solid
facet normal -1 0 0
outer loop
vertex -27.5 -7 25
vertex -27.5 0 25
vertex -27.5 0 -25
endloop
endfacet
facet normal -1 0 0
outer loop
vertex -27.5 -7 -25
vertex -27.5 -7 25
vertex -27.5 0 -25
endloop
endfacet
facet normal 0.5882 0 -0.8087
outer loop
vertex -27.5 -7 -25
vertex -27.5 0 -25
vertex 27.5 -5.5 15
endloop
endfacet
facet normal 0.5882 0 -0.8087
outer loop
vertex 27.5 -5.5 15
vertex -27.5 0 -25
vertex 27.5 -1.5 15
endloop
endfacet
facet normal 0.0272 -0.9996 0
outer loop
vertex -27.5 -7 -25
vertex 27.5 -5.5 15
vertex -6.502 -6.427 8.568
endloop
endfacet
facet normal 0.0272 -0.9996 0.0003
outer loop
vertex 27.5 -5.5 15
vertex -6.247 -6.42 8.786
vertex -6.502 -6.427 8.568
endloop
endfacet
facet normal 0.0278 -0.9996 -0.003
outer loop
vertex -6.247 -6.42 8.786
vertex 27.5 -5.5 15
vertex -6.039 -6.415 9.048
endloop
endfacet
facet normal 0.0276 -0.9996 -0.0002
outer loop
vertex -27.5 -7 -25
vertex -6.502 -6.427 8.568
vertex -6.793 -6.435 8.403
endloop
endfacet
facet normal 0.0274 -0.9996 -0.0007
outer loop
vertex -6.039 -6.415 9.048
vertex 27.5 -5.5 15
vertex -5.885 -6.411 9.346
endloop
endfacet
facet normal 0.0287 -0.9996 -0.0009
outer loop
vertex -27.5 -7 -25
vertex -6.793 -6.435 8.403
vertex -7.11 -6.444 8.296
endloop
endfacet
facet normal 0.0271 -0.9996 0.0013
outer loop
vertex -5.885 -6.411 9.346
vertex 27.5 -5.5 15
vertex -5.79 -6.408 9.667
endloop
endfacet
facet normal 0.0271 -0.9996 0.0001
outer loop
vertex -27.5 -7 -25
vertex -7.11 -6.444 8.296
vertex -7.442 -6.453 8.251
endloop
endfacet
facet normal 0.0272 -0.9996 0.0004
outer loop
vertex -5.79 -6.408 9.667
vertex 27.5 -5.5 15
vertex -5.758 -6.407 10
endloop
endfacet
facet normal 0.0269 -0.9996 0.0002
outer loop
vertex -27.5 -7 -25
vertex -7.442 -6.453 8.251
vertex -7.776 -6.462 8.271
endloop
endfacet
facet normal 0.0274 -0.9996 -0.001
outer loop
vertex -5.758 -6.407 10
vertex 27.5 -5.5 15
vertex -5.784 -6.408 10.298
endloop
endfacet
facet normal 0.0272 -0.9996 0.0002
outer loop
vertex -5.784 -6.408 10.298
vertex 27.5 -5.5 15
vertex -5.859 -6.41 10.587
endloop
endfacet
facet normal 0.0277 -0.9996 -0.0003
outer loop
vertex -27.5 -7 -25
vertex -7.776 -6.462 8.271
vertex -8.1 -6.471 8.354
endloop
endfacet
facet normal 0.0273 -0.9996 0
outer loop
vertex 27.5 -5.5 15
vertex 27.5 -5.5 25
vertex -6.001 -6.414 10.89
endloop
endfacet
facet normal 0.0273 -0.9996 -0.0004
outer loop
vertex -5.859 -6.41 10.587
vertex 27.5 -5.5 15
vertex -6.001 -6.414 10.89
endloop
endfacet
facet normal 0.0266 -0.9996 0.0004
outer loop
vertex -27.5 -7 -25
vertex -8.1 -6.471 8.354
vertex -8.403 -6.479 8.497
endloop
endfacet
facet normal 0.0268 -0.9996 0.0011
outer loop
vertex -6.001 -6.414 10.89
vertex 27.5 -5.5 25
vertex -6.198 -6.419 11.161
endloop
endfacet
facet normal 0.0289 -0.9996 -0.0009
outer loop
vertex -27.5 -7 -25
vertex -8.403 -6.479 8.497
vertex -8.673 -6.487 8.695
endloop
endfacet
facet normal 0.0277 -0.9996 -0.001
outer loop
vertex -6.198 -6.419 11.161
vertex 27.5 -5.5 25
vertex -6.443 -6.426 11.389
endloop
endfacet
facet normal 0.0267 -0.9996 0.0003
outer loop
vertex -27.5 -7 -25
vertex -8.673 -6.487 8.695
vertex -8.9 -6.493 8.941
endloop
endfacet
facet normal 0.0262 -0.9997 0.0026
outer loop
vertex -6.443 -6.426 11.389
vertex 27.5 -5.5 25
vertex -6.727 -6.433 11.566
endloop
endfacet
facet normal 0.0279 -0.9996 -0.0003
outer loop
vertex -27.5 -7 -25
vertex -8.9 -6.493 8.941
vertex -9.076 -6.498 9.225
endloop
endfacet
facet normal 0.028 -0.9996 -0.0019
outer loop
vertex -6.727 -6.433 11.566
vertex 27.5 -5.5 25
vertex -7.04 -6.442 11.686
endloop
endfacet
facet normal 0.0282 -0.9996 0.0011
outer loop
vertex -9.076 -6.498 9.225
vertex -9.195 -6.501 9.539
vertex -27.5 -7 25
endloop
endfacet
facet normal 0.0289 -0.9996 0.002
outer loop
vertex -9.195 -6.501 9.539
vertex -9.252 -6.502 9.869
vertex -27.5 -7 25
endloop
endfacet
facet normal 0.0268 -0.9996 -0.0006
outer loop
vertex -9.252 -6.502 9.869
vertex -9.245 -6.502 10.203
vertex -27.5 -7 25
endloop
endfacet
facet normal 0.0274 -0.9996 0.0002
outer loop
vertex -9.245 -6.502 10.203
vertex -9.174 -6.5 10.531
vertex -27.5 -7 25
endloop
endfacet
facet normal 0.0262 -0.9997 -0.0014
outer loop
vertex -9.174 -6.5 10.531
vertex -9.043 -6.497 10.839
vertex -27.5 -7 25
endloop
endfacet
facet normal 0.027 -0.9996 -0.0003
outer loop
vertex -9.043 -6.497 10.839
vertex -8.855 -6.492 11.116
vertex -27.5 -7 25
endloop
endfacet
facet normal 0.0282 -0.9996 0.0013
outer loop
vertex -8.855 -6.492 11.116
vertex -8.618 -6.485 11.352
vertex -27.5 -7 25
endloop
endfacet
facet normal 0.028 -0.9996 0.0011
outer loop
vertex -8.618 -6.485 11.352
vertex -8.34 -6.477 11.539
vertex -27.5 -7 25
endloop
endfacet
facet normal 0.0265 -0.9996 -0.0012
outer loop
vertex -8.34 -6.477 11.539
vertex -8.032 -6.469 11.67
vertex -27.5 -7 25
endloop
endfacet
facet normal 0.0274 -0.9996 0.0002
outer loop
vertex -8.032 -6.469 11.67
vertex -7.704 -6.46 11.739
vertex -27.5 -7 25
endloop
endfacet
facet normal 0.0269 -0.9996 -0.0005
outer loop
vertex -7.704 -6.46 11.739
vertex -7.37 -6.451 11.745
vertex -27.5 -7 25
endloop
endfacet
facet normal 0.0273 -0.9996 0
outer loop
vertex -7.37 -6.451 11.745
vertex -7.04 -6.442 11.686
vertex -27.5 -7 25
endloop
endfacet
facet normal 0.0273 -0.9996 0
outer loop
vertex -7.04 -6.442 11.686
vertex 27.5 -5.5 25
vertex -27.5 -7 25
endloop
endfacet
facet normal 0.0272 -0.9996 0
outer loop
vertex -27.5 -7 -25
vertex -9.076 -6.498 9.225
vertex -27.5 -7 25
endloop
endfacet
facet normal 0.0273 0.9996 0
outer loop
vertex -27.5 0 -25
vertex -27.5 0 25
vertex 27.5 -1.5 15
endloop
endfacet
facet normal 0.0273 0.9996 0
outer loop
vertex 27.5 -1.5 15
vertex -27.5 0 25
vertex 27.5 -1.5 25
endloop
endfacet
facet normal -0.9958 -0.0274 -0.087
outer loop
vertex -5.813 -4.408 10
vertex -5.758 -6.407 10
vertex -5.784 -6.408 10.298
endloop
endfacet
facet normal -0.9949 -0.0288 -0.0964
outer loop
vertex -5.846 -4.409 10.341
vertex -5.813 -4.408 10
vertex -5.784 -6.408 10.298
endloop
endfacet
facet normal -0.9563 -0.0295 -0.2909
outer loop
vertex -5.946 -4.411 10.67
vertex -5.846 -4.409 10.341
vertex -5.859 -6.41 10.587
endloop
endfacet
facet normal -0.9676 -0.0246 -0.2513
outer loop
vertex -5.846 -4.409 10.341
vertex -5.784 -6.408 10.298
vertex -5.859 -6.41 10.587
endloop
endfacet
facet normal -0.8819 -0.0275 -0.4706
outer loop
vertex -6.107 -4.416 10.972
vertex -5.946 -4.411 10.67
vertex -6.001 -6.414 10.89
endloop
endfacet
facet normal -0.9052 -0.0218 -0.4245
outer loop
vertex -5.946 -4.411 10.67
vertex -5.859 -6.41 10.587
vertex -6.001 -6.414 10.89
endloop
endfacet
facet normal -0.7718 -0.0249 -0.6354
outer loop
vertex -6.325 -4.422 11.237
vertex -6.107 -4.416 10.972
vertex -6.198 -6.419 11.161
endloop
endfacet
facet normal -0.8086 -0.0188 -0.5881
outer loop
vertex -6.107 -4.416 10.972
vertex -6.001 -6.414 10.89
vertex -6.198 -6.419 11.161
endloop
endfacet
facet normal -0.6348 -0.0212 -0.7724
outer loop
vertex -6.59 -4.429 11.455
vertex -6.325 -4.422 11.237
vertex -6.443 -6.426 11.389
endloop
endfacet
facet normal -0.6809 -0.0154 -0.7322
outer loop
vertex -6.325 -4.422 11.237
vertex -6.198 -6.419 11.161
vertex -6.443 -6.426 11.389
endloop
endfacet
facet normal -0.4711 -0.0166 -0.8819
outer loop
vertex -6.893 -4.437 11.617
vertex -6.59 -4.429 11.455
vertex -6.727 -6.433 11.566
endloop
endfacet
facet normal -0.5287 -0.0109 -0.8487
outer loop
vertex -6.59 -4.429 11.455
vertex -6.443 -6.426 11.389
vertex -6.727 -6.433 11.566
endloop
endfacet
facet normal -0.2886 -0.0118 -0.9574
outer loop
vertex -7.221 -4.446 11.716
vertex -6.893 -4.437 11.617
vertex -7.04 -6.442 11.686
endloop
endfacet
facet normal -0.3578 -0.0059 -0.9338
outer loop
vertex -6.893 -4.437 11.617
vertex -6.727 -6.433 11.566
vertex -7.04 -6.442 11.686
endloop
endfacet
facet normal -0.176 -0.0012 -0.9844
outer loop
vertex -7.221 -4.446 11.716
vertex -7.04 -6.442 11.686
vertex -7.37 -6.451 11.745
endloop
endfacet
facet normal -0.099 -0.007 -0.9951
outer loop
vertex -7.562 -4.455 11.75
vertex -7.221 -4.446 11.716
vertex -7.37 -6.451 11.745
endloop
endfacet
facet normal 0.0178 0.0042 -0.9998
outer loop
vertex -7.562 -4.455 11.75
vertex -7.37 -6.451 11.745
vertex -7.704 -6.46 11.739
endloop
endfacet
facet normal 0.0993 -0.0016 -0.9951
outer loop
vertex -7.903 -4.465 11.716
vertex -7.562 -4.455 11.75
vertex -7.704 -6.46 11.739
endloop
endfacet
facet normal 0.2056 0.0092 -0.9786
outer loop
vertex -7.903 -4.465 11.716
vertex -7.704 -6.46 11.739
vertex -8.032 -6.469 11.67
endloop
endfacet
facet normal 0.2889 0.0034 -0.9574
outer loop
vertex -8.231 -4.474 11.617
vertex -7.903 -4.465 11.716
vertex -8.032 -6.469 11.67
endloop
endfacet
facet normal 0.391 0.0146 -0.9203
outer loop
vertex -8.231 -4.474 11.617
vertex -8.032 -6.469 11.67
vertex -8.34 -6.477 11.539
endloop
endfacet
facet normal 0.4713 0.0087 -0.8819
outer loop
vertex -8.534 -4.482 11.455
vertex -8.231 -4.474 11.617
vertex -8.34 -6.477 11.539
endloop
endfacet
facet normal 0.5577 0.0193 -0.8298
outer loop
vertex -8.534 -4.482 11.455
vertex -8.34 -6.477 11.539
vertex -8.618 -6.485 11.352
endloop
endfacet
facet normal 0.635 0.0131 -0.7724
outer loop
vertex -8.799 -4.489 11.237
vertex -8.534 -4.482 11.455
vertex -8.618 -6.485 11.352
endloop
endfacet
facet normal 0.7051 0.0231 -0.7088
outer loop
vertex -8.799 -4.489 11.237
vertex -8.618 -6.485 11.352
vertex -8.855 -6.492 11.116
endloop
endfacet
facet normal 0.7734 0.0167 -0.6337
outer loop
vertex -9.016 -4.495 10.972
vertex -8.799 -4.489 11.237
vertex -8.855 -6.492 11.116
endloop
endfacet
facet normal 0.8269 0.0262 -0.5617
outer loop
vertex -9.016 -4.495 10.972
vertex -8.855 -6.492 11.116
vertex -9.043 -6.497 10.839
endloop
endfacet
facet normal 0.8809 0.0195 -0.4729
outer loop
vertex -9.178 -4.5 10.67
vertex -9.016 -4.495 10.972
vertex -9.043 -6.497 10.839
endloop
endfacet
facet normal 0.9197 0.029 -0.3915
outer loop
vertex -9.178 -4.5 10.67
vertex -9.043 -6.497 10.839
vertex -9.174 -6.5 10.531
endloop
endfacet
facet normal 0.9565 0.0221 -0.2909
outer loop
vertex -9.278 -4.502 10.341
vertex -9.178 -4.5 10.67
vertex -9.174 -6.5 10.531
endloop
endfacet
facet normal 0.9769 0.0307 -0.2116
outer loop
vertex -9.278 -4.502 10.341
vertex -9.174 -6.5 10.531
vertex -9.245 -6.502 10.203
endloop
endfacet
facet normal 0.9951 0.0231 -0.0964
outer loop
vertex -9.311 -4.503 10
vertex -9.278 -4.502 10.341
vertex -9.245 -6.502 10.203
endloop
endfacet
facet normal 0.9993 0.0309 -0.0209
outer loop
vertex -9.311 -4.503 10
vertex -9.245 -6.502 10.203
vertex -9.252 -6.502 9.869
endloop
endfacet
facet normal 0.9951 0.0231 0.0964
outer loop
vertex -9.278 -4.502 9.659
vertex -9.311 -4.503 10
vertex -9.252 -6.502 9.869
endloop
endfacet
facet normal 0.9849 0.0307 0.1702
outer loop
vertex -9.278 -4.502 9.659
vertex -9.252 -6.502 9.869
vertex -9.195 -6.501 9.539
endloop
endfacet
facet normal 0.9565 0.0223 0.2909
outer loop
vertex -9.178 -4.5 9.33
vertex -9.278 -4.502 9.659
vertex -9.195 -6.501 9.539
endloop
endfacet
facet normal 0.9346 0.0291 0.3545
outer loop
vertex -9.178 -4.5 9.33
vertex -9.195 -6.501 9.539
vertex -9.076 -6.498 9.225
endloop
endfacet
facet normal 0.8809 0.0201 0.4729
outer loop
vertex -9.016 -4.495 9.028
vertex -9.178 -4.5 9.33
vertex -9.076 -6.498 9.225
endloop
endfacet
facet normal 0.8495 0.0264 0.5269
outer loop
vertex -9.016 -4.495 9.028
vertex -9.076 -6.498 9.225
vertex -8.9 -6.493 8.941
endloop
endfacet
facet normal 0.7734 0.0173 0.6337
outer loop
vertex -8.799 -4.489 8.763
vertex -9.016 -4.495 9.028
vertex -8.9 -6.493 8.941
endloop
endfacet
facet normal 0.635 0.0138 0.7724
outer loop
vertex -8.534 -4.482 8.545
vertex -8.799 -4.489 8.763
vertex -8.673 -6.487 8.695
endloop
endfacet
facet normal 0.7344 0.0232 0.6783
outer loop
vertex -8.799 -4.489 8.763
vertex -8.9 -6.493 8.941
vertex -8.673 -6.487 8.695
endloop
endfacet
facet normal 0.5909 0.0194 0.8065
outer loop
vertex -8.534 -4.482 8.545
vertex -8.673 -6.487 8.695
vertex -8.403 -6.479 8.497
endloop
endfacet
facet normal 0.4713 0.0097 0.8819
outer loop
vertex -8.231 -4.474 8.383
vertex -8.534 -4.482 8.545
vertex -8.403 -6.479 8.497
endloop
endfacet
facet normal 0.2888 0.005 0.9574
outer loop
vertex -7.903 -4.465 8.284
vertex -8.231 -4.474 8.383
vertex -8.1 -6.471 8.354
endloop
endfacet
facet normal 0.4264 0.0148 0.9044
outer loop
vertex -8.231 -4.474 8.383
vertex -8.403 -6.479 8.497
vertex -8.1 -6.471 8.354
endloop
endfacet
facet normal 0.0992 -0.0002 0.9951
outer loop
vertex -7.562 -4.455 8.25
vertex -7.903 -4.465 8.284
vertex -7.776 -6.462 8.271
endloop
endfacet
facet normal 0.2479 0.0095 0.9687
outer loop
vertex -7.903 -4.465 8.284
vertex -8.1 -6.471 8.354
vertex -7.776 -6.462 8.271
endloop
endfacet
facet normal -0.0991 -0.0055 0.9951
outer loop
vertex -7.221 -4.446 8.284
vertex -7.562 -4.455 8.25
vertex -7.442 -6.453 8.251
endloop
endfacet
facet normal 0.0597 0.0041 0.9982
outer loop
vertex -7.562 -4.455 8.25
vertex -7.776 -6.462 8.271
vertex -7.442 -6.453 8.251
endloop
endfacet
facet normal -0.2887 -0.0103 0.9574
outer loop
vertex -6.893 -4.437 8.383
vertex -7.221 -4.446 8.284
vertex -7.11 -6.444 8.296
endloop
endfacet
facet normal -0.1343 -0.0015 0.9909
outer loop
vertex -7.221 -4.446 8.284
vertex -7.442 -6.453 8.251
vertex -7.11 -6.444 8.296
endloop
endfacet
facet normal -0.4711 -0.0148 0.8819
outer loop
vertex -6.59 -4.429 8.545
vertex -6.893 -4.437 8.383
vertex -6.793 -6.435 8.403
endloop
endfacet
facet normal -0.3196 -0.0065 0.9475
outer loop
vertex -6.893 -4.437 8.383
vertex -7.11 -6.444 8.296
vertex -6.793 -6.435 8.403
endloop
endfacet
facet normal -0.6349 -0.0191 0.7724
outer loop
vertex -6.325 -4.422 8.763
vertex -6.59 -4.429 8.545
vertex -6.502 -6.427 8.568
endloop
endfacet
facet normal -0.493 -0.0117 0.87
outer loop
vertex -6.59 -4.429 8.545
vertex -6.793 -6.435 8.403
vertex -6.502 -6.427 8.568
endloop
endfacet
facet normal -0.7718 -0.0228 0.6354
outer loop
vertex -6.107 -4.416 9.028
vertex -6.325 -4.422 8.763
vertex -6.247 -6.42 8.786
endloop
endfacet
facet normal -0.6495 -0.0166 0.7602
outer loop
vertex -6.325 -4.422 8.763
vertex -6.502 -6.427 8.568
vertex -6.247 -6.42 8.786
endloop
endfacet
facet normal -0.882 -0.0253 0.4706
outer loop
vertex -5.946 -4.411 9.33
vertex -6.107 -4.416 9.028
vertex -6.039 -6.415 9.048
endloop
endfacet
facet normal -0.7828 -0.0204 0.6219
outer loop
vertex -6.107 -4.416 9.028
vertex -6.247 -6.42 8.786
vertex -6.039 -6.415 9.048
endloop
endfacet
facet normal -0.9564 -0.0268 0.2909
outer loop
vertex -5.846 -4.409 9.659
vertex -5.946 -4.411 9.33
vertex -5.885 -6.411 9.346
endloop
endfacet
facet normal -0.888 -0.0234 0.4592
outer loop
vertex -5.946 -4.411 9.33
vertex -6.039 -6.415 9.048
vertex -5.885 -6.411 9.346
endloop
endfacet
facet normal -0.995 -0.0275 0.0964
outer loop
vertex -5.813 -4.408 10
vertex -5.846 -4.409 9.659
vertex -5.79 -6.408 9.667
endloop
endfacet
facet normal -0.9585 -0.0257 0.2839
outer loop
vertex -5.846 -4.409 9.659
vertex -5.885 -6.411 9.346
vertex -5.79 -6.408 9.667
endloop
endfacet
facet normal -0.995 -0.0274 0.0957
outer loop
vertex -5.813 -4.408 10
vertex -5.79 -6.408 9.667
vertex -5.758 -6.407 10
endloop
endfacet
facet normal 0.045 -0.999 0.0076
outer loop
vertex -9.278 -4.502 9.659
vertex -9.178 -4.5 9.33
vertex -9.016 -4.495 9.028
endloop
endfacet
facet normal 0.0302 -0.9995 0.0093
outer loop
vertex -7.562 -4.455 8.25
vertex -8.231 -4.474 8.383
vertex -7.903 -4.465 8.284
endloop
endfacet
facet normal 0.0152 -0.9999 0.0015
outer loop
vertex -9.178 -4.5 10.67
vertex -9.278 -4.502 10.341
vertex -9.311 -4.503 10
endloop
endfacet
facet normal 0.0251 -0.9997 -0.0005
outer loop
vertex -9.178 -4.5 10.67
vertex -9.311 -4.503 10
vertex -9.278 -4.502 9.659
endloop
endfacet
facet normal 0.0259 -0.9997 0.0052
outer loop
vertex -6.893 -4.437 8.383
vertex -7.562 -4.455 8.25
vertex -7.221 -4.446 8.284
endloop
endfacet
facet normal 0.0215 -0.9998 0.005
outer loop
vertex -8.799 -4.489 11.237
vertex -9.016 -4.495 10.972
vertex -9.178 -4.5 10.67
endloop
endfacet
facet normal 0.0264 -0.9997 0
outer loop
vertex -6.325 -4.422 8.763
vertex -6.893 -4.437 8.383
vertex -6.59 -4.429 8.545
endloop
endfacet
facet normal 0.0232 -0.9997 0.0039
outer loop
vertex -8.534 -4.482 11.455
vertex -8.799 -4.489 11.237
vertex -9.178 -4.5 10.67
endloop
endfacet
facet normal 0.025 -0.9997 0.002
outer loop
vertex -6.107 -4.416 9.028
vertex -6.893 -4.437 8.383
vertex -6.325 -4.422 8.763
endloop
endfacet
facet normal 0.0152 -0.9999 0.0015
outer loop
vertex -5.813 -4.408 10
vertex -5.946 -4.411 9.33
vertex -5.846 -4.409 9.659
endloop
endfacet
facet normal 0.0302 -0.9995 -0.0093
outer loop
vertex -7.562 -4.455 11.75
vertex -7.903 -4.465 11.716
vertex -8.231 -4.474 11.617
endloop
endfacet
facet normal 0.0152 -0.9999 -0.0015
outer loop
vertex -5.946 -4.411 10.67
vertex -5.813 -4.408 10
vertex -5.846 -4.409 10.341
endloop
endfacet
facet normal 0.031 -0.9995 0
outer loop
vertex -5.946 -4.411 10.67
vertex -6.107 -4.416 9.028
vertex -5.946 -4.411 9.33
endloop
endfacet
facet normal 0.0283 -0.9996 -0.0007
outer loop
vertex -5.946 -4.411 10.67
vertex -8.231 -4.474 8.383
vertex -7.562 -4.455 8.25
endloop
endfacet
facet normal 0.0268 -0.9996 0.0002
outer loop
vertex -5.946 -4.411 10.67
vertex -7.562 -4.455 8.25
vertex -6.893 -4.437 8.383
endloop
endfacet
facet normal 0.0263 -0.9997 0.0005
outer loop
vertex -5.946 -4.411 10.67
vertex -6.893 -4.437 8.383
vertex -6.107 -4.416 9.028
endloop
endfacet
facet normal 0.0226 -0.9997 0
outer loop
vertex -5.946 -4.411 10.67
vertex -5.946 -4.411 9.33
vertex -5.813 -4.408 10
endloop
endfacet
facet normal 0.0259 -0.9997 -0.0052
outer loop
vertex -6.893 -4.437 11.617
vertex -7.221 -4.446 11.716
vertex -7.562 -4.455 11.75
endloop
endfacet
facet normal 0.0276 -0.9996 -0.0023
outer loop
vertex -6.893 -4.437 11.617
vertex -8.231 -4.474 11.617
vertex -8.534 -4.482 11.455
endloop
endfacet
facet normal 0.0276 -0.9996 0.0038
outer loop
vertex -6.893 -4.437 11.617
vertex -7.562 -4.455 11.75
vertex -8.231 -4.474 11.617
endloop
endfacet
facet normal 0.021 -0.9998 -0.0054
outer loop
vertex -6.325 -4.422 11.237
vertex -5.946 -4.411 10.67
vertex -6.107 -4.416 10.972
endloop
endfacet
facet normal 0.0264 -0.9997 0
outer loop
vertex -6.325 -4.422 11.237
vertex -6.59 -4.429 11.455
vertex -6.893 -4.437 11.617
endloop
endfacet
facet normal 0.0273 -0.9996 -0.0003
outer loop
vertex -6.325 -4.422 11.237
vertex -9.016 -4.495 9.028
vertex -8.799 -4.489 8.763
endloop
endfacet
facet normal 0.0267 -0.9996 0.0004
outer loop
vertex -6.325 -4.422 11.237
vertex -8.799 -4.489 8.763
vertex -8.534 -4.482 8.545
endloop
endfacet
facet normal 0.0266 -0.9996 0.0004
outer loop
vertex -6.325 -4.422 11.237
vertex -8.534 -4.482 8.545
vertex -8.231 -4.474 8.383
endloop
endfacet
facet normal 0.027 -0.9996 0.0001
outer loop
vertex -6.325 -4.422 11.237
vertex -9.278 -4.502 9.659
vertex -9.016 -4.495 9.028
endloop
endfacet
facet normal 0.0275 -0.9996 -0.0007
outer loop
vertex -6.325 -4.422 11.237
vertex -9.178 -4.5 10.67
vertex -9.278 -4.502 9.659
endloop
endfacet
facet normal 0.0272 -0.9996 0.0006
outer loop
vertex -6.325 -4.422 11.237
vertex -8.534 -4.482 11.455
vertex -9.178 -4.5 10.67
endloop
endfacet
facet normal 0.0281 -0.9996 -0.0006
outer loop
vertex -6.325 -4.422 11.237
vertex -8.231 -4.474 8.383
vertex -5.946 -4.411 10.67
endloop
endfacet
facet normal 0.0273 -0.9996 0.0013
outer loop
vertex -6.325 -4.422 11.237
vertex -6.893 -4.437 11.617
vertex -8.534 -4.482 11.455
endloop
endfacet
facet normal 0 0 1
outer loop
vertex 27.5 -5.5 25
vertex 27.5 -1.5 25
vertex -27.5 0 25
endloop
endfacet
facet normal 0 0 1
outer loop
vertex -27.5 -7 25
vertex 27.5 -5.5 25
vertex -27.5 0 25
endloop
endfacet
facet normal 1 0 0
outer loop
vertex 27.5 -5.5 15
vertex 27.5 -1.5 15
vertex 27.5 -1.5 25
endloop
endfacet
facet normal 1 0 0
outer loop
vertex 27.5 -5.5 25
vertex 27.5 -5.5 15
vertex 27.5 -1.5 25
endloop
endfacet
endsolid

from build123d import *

# Parameters (mm, degrees)
F1_DEPTH = 7
F3_DEPTH = 50.001
F4_R     = 1.75
F5_DEPTH = 2


with BuildPart() as f1:
    # F0 (on Front) → F1 (new body)
    with BuildSketch(Plane.XZ):
        Polygon((27.5, 15), (27.5, 25), (-27.5, 25), (-27.5, -25), align=None)
    extrude(amount=F1_DEPTH)

    # F2 (on face) → F3 (cut, through all)
    with BuildSketch(Plane.XY.offset(25)):
        Polygon((27.5, 0), (-27.5, 0), (27.5, -1.5), align=None)
        Polygon((27.5, -5.5), (-27.5, -7), (27.5, -7), align=None)
    extrude(amount=-F3_DEPTH, mode=Mode.SUBTRACT)

    # F4 (on face) → F5 (cut)
    with BuildSketch(Plane(origin=(0.170328, -6.245355, 0), x_dir=(0.999628, 0.027263, 0), z_dir=(0.027263, -0.999628, 0))):
        with Locations((-7.680617, 10)):
            Circle(F4_R)
    extrude(amount=-F5_DEPTH, mode=Mode.SUBTRACT)


solid = f1.part
